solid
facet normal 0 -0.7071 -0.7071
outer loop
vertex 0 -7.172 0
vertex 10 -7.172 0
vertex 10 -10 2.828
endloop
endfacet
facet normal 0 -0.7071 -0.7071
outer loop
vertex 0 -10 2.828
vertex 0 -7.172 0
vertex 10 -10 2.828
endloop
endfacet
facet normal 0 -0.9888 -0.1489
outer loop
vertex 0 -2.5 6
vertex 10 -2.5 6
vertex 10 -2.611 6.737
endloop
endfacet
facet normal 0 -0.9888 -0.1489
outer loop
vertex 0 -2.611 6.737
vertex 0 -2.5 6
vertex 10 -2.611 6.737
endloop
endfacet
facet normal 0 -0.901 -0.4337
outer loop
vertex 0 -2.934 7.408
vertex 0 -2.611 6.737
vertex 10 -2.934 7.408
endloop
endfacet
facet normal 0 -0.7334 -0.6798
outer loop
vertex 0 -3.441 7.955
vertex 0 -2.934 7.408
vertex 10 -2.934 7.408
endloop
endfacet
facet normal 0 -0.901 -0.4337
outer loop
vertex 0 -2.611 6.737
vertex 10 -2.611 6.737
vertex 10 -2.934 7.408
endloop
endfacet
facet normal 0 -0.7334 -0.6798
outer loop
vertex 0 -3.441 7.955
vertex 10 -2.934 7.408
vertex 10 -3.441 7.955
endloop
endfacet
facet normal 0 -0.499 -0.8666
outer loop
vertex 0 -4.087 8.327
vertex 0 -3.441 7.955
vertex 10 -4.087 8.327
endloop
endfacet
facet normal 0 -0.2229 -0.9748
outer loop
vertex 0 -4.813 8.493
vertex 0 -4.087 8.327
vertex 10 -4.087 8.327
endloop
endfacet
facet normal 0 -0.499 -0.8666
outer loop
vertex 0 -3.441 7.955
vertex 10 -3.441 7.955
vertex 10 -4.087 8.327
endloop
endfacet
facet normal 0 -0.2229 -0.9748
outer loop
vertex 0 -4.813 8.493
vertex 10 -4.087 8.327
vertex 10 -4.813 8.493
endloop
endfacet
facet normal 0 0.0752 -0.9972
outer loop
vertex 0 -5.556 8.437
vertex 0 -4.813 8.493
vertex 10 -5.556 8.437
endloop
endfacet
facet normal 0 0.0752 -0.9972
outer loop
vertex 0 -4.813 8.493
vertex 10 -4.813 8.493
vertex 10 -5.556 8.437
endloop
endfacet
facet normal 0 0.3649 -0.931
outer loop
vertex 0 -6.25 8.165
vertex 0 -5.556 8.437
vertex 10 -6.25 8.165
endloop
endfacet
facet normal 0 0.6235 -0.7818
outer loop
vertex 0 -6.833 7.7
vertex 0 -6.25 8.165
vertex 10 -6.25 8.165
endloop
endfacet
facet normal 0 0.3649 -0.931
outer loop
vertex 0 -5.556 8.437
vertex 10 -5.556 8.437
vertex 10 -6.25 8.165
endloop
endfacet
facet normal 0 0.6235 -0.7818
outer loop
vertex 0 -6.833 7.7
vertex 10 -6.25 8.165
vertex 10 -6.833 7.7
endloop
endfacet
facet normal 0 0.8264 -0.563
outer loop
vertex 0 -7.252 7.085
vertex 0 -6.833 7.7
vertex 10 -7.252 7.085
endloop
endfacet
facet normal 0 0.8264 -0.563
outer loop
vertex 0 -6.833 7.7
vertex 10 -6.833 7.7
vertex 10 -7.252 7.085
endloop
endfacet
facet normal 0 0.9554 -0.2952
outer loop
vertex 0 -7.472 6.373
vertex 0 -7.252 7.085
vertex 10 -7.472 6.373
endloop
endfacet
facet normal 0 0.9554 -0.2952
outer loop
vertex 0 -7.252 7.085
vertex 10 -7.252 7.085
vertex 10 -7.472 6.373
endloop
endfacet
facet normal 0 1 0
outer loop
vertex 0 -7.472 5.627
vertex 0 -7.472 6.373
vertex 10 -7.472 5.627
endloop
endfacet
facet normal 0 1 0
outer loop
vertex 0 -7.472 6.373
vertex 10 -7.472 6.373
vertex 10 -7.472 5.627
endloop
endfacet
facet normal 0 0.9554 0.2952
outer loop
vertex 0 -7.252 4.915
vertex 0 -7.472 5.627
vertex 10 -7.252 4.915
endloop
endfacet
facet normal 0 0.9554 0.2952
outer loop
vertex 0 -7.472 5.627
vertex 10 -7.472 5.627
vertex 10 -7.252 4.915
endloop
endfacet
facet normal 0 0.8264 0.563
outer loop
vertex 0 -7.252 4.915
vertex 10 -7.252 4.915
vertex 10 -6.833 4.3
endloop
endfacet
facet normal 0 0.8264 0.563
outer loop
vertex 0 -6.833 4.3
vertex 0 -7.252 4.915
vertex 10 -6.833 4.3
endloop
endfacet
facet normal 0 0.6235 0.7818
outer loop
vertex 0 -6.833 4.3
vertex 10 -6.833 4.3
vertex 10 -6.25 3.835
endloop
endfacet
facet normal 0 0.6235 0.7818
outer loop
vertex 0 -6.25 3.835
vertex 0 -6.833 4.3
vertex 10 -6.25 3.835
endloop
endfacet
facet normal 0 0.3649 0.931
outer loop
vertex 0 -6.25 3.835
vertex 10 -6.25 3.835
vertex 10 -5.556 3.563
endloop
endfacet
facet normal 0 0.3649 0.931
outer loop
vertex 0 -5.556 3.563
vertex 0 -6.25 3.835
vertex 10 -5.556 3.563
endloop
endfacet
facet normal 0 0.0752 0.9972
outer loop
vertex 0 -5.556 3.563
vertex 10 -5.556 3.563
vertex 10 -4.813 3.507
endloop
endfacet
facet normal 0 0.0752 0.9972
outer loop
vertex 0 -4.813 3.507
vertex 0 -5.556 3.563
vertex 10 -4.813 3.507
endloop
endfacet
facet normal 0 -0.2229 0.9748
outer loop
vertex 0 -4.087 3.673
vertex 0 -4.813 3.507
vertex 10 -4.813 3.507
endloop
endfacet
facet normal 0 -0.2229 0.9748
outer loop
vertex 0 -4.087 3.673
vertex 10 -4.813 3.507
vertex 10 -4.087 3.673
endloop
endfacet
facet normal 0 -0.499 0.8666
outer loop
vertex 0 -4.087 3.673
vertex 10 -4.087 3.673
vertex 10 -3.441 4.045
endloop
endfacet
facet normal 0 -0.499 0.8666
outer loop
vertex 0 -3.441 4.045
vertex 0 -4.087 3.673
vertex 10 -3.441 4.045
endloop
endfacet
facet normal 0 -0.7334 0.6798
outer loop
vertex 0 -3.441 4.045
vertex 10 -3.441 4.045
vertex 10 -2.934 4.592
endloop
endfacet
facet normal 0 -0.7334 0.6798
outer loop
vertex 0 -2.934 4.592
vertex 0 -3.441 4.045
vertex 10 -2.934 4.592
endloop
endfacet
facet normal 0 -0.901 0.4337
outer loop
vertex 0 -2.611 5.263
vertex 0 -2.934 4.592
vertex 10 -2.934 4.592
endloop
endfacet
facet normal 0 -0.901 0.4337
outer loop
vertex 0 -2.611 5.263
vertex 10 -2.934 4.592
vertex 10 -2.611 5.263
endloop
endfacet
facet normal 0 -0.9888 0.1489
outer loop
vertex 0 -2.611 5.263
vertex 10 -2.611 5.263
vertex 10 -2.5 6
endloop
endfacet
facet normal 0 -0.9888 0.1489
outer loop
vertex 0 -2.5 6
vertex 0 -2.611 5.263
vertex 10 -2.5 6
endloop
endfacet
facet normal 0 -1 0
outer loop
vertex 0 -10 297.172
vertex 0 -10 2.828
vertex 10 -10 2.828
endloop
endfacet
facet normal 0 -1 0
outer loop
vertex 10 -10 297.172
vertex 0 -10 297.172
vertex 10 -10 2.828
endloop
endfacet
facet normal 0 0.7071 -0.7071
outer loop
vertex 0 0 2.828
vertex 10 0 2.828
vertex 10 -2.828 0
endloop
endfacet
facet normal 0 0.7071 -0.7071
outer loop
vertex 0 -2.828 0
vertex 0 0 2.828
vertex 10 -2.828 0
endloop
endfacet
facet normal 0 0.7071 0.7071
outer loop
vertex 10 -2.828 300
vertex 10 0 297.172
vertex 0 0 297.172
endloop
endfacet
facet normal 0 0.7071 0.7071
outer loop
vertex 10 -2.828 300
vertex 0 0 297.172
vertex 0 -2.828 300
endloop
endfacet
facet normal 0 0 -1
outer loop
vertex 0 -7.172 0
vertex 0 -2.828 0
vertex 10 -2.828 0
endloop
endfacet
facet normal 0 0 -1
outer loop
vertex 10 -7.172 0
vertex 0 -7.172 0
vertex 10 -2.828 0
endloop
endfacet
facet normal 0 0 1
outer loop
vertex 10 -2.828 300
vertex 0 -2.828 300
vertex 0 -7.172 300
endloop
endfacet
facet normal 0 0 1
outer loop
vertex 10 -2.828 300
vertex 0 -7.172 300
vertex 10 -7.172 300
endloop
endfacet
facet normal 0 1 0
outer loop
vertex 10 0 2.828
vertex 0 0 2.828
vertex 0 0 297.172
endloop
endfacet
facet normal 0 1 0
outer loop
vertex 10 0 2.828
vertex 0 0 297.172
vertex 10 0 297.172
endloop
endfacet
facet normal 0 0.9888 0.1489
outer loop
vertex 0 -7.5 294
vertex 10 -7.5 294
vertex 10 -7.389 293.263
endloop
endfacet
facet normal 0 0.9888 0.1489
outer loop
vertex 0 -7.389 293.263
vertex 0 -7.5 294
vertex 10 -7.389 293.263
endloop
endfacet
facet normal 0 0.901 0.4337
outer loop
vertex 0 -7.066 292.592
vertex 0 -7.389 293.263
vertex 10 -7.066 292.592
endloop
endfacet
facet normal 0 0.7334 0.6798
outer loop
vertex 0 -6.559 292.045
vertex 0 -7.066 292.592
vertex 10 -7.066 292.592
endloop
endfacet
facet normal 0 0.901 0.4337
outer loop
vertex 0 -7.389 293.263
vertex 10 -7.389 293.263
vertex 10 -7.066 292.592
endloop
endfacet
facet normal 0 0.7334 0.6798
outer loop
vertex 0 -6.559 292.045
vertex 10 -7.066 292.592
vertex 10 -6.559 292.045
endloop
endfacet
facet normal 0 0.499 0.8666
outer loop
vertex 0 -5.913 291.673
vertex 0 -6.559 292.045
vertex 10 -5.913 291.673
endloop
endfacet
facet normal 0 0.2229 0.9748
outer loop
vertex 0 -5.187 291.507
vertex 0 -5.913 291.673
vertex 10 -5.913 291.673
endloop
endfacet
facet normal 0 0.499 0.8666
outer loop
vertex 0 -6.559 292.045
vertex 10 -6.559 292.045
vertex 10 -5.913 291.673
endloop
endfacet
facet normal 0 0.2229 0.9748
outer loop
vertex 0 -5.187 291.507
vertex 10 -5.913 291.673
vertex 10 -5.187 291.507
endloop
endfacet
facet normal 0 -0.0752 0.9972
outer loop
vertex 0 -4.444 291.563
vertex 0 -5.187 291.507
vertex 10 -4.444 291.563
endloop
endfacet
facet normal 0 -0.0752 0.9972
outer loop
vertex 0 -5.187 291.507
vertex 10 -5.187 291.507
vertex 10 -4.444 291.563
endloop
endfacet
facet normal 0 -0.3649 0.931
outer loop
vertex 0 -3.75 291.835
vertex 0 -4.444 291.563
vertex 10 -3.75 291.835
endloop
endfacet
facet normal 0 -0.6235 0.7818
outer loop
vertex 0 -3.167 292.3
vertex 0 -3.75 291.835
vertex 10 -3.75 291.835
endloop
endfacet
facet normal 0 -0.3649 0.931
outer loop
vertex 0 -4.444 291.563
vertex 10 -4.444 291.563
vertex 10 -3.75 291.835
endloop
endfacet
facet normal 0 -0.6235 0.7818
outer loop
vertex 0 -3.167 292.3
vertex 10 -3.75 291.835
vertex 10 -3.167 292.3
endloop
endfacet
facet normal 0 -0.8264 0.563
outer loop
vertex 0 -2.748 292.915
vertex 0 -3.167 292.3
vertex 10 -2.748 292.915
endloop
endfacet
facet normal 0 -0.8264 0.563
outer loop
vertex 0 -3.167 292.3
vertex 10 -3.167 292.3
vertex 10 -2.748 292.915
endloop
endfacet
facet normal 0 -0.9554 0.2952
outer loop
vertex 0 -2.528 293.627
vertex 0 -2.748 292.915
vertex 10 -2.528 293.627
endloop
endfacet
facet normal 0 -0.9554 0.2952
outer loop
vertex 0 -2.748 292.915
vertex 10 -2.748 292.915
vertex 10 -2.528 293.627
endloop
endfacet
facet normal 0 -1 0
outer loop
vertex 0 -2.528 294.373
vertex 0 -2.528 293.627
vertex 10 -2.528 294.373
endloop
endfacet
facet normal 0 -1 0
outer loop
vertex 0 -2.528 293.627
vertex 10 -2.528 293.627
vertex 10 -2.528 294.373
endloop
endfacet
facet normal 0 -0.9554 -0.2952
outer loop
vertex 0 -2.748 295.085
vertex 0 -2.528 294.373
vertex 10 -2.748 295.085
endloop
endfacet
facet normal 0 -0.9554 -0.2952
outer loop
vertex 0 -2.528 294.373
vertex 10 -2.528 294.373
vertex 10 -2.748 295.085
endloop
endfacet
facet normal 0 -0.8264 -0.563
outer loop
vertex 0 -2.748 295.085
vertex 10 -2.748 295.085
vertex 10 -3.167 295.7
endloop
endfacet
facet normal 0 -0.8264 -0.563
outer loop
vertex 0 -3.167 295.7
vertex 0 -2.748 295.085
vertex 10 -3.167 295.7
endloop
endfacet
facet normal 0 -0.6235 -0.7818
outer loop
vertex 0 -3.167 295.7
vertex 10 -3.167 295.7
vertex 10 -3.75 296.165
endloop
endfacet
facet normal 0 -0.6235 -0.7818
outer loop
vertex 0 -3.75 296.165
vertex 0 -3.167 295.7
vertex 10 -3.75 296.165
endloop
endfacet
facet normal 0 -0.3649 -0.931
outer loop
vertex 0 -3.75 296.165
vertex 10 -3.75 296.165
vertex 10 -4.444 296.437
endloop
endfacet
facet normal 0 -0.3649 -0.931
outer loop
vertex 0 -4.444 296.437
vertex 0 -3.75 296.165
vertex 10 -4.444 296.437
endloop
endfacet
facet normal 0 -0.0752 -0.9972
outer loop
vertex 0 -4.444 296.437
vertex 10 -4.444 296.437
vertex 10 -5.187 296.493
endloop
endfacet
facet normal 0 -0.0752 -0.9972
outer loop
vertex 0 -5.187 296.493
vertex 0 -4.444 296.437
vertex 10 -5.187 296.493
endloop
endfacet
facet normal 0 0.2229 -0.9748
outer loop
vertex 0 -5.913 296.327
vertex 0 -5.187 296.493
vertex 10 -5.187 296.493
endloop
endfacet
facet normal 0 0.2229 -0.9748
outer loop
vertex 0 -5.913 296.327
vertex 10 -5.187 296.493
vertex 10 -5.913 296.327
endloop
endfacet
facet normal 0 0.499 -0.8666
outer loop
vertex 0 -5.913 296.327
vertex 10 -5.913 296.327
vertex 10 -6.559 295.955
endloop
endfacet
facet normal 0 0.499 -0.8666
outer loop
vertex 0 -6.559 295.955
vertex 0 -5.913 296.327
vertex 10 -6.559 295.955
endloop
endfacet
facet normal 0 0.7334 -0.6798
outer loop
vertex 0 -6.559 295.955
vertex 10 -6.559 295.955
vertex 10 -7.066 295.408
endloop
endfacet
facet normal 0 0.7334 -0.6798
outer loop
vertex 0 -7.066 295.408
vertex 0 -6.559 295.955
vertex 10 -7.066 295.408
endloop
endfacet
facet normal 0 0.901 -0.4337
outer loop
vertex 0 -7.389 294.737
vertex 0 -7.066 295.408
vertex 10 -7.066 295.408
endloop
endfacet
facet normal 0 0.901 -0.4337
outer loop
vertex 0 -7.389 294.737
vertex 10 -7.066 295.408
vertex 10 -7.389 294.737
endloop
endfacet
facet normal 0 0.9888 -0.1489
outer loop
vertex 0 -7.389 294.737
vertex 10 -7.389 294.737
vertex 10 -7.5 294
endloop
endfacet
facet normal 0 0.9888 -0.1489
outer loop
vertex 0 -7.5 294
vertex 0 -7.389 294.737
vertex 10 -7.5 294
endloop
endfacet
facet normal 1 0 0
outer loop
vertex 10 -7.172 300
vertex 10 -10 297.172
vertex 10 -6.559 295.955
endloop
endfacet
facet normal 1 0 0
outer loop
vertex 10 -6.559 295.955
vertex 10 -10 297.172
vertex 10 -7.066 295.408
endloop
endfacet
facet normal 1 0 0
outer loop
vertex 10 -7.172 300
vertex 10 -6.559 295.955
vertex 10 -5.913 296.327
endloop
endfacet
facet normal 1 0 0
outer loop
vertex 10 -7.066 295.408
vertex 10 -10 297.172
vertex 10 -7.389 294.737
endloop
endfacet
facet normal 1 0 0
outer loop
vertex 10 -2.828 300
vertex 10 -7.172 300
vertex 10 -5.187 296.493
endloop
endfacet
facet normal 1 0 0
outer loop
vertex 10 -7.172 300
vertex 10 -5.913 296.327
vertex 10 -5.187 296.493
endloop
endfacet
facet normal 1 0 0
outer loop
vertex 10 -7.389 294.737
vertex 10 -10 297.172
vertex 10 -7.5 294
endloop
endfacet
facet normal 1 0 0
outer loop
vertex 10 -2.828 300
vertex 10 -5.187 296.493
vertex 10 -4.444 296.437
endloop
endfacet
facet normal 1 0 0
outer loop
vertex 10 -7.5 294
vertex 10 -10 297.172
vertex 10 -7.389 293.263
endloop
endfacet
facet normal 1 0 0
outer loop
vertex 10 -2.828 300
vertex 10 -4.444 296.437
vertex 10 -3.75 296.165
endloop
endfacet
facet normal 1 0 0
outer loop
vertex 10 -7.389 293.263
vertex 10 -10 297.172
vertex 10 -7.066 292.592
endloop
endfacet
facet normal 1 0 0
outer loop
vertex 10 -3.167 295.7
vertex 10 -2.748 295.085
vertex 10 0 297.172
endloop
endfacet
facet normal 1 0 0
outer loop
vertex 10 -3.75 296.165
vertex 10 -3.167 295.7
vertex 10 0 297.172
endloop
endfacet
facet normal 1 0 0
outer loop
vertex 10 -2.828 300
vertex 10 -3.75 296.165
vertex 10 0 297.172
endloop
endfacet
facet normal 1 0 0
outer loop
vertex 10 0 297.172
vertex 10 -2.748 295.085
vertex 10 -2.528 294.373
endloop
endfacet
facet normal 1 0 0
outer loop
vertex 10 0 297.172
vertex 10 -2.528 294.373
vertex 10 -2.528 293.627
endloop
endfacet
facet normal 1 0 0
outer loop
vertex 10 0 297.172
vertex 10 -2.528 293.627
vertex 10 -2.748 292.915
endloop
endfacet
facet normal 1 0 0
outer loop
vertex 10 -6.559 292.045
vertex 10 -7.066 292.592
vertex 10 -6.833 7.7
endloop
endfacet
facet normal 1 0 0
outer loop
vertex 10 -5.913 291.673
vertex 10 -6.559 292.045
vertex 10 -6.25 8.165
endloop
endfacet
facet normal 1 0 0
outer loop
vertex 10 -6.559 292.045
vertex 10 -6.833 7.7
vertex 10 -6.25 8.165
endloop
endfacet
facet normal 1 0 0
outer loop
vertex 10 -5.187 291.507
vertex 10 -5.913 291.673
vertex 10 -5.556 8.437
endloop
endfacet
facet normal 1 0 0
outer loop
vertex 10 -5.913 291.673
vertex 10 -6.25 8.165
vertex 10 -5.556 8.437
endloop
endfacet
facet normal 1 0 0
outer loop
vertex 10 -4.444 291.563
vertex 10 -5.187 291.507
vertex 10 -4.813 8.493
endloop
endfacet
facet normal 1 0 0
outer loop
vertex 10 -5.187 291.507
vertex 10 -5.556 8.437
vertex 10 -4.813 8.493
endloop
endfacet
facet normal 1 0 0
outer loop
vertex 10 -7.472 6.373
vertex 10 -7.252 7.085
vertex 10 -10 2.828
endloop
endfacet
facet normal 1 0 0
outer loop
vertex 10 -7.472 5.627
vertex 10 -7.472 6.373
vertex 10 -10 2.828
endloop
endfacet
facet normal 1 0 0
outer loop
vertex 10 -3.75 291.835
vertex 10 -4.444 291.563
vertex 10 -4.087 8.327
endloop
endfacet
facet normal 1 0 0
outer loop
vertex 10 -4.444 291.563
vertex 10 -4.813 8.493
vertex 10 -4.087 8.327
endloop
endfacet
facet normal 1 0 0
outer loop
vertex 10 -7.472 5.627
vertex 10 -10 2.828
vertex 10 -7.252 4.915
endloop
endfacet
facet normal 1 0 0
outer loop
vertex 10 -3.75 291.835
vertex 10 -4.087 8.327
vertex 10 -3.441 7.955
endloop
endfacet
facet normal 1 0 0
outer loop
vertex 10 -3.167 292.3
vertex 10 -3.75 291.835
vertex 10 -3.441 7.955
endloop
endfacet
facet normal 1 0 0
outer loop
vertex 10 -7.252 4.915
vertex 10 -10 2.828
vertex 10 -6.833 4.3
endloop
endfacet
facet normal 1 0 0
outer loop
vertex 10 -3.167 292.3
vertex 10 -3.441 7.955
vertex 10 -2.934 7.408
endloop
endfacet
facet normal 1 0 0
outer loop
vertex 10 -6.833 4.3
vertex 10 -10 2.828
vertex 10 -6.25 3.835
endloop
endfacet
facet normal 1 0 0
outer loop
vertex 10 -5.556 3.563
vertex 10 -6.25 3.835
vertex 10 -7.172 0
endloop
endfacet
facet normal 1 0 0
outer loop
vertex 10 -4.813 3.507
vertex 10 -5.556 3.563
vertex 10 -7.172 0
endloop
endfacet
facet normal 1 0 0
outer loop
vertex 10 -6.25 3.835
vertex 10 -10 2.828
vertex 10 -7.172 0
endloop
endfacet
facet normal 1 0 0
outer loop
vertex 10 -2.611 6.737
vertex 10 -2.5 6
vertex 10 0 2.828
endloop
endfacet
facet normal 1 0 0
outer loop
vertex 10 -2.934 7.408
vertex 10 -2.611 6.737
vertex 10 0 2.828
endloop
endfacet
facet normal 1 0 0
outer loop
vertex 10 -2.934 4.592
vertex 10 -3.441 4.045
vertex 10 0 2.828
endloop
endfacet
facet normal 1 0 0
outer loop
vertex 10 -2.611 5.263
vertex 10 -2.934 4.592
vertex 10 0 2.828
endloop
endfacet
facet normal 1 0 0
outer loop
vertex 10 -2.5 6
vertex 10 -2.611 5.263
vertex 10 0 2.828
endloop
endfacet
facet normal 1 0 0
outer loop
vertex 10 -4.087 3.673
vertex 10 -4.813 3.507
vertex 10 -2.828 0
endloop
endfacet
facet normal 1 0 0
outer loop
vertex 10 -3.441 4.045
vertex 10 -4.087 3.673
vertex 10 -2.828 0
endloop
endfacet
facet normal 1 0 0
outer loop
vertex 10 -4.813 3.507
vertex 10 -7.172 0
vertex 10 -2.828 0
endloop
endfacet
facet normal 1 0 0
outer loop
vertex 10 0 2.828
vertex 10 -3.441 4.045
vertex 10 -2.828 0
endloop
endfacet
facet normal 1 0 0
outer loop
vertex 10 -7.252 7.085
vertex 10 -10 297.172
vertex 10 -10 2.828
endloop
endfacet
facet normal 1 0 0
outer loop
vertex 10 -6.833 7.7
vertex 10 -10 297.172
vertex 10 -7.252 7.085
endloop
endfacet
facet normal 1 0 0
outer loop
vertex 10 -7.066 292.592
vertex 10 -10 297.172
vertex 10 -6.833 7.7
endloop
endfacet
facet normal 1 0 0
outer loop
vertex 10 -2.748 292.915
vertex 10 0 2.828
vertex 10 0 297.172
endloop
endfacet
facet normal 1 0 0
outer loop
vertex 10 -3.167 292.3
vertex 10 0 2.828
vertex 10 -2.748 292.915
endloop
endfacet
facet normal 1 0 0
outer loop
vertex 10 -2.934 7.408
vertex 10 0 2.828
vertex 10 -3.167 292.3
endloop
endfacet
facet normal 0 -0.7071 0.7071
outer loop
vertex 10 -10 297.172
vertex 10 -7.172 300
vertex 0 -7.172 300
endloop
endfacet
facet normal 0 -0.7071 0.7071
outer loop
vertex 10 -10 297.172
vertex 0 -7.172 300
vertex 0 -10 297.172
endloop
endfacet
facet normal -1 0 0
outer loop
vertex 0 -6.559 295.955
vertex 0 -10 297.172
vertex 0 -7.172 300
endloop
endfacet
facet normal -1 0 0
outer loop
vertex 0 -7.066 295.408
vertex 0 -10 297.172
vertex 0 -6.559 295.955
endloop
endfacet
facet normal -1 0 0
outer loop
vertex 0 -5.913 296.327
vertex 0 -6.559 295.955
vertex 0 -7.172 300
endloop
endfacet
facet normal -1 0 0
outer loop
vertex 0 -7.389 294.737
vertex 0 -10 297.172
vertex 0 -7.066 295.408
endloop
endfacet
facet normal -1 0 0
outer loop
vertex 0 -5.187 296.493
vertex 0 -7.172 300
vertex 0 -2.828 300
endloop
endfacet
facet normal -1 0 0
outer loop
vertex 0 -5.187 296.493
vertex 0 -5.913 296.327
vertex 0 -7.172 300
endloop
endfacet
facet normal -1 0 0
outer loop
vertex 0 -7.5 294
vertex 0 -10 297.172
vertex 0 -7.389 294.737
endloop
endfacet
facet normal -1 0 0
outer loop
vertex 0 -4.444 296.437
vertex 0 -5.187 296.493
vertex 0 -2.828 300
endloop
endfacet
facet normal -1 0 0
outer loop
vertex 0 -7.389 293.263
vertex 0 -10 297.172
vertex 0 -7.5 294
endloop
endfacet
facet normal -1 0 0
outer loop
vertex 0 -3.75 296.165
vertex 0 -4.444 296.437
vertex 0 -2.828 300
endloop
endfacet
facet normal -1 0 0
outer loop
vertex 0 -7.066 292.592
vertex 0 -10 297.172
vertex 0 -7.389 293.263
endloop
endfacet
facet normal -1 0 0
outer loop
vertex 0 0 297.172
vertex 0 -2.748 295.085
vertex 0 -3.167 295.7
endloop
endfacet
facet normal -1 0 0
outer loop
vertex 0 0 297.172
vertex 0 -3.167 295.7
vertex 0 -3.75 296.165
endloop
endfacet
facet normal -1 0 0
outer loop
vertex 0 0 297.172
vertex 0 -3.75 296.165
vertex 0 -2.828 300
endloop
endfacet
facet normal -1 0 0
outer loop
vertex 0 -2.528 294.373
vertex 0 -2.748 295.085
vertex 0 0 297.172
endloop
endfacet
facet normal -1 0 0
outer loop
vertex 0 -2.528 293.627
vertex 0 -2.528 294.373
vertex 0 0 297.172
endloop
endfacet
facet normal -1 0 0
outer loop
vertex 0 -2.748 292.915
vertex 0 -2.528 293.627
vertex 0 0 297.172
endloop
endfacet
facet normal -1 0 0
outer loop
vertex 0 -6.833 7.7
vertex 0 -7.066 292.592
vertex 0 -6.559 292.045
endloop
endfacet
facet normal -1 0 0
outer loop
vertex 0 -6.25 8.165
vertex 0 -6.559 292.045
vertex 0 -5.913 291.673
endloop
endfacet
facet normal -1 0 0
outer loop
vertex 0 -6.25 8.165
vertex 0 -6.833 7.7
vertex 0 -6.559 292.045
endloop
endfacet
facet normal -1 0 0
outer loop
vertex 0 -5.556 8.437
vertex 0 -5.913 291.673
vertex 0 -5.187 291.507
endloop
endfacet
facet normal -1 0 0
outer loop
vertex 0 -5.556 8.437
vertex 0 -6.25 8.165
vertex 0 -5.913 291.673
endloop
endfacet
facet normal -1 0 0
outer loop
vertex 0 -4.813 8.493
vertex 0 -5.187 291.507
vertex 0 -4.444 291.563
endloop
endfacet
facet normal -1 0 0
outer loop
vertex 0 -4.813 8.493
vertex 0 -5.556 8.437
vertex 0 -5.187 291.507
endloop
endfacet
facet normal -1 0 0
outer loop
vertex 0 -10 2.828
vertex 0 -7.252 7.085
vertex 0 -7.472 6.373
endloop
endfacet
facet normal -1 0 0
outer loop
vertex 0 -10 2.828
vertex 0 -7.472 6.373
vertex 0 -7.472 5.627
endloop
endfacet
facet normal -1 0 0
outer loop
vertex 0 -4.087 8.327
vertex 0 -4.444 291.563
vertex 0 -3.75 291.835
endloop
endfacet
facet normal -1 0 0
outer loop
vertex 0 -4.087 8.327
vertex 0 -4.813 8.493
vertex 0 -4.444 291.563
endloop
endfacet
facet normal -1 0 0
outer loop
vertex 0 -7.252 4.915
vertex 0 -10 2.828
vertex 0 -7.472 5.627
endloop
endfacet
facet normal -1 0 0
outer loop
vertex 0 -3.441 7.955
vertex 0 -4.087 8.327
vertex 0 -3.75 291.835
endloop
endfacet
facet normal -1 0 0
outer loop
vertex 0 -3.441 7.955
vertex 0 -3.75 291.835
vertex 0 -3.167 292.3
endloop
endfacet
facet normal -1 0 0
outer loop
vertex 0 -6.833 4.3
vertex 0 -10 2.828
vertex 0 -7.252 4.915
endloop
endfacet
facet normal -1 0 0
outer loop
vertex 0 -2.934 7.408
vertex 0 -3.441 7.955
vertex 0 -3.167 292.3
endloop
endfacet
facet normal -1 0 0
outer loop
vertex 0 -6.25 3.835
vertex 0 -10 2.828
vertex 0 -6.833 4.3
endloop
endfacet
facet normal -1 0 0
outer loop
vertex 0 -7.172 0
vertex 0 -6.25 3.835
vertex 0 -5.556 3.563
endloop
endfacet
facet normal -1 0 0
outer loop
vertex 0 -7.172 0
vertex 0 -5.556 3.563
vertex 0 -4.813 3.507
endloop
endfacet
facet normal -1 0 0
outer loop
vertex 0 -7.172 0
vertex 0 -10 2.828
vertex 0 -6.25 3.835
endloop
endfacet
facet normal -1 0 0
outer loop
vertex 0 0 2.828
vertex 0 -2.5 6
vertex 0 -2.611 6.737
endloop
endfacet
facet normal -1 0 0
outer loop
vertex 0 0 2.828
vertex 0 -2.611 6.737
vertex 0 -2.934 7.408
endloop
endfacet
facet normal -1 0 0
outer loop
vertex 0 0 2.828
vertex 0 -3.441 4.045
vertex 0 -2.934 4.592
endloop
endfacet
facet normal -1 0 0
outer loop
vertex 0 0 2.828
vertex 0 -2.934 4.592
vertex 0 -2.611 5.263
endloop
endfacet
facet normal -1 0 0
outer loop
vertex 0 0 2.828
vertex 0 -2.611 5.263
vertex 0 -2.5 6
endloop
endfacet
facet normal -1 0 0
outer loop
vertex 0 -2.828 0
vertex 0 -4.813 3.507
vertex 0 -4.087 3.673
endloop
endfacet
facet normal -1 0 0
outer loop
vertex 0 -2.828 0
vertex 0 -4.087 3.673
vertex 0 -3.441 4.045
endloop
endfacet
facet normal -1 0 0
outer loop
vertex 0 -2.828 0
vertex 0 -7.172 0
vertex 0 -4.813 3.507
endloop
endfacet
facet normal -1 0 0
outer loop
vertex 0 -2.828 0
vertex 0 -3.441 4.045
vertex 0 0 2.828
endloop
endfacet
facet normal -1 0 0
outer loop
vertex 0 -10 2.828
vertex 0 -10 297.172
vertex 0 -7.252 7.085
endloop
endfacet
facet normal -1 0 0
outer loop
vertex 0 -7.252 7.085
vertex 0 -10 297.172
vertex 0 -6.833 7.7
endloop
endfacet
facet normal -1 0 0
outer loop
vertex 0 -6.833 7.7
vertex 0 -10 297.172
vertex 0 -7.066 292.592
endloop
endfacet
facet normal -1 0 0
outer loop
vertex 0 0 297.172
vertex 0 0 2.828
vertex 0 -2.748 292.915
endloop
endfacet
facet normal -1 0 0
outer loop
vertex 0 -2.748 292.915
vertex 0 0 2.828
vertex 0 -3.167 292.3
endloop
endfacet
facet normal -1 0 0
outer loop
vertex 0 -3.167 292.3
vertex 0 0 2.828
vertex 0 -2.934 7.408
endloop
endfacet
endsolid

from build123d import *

# Parameters (mm, degrees)
SKETCH_1_W          = 10
SKETCH_1_H          = 10
EXTRUDE_1_DEPTH     = 300
SKETCH_2_R          = 2.5
CUT_EXTRUDE_1_DEPTH = 301.333148354


with BuildPart() as part:
    # ｽｹｯﾁ1 → ﾎﾞｽ - 押し出し1 (new body)
    with BuildSketch(Plane.XY):
        with Locations((5, -5)):
            Rectangle(SKETCH_1_W, SKETCH_1_H)
    extrude(amount=EXTRUDE_1_DEPTH)

    # ｽｹｯﾁ2 → ｶｯﾄ - 押し出し1 (cut, through all)
    with BuildSketch(Plane(origin=(10, 0, 0), x_dir=(0, 0, -1), z_dir=(1, 0, 0))):
        with Locations(Location((-6, -5, 0), (0, 0, 90))):
            Circle(SKETCH_2_R)
        with Locations(Location((-294, -5, 0), (0, 0, 270))):
            Circle(SKETCH_2_R)
        Polygon((-2.828427125, 0), (0, -2.828427125), (0, 0), align=None)
        Polygon((0, -7.171572875), (-2.828427125, -10), (0, -10), align=None)
        Polygon((-300, 0), (-297.171572875, 0), (-300, -2.828427125), align=None)
        Polygon((-300, -10), (-300, -7.171572875), (-297.171572875, -10), align=None)
    extrude(amount=-CUT_EXTRUDE_1_DEPTH, mode=Mode.SUBTRACT)


solid = part.part
